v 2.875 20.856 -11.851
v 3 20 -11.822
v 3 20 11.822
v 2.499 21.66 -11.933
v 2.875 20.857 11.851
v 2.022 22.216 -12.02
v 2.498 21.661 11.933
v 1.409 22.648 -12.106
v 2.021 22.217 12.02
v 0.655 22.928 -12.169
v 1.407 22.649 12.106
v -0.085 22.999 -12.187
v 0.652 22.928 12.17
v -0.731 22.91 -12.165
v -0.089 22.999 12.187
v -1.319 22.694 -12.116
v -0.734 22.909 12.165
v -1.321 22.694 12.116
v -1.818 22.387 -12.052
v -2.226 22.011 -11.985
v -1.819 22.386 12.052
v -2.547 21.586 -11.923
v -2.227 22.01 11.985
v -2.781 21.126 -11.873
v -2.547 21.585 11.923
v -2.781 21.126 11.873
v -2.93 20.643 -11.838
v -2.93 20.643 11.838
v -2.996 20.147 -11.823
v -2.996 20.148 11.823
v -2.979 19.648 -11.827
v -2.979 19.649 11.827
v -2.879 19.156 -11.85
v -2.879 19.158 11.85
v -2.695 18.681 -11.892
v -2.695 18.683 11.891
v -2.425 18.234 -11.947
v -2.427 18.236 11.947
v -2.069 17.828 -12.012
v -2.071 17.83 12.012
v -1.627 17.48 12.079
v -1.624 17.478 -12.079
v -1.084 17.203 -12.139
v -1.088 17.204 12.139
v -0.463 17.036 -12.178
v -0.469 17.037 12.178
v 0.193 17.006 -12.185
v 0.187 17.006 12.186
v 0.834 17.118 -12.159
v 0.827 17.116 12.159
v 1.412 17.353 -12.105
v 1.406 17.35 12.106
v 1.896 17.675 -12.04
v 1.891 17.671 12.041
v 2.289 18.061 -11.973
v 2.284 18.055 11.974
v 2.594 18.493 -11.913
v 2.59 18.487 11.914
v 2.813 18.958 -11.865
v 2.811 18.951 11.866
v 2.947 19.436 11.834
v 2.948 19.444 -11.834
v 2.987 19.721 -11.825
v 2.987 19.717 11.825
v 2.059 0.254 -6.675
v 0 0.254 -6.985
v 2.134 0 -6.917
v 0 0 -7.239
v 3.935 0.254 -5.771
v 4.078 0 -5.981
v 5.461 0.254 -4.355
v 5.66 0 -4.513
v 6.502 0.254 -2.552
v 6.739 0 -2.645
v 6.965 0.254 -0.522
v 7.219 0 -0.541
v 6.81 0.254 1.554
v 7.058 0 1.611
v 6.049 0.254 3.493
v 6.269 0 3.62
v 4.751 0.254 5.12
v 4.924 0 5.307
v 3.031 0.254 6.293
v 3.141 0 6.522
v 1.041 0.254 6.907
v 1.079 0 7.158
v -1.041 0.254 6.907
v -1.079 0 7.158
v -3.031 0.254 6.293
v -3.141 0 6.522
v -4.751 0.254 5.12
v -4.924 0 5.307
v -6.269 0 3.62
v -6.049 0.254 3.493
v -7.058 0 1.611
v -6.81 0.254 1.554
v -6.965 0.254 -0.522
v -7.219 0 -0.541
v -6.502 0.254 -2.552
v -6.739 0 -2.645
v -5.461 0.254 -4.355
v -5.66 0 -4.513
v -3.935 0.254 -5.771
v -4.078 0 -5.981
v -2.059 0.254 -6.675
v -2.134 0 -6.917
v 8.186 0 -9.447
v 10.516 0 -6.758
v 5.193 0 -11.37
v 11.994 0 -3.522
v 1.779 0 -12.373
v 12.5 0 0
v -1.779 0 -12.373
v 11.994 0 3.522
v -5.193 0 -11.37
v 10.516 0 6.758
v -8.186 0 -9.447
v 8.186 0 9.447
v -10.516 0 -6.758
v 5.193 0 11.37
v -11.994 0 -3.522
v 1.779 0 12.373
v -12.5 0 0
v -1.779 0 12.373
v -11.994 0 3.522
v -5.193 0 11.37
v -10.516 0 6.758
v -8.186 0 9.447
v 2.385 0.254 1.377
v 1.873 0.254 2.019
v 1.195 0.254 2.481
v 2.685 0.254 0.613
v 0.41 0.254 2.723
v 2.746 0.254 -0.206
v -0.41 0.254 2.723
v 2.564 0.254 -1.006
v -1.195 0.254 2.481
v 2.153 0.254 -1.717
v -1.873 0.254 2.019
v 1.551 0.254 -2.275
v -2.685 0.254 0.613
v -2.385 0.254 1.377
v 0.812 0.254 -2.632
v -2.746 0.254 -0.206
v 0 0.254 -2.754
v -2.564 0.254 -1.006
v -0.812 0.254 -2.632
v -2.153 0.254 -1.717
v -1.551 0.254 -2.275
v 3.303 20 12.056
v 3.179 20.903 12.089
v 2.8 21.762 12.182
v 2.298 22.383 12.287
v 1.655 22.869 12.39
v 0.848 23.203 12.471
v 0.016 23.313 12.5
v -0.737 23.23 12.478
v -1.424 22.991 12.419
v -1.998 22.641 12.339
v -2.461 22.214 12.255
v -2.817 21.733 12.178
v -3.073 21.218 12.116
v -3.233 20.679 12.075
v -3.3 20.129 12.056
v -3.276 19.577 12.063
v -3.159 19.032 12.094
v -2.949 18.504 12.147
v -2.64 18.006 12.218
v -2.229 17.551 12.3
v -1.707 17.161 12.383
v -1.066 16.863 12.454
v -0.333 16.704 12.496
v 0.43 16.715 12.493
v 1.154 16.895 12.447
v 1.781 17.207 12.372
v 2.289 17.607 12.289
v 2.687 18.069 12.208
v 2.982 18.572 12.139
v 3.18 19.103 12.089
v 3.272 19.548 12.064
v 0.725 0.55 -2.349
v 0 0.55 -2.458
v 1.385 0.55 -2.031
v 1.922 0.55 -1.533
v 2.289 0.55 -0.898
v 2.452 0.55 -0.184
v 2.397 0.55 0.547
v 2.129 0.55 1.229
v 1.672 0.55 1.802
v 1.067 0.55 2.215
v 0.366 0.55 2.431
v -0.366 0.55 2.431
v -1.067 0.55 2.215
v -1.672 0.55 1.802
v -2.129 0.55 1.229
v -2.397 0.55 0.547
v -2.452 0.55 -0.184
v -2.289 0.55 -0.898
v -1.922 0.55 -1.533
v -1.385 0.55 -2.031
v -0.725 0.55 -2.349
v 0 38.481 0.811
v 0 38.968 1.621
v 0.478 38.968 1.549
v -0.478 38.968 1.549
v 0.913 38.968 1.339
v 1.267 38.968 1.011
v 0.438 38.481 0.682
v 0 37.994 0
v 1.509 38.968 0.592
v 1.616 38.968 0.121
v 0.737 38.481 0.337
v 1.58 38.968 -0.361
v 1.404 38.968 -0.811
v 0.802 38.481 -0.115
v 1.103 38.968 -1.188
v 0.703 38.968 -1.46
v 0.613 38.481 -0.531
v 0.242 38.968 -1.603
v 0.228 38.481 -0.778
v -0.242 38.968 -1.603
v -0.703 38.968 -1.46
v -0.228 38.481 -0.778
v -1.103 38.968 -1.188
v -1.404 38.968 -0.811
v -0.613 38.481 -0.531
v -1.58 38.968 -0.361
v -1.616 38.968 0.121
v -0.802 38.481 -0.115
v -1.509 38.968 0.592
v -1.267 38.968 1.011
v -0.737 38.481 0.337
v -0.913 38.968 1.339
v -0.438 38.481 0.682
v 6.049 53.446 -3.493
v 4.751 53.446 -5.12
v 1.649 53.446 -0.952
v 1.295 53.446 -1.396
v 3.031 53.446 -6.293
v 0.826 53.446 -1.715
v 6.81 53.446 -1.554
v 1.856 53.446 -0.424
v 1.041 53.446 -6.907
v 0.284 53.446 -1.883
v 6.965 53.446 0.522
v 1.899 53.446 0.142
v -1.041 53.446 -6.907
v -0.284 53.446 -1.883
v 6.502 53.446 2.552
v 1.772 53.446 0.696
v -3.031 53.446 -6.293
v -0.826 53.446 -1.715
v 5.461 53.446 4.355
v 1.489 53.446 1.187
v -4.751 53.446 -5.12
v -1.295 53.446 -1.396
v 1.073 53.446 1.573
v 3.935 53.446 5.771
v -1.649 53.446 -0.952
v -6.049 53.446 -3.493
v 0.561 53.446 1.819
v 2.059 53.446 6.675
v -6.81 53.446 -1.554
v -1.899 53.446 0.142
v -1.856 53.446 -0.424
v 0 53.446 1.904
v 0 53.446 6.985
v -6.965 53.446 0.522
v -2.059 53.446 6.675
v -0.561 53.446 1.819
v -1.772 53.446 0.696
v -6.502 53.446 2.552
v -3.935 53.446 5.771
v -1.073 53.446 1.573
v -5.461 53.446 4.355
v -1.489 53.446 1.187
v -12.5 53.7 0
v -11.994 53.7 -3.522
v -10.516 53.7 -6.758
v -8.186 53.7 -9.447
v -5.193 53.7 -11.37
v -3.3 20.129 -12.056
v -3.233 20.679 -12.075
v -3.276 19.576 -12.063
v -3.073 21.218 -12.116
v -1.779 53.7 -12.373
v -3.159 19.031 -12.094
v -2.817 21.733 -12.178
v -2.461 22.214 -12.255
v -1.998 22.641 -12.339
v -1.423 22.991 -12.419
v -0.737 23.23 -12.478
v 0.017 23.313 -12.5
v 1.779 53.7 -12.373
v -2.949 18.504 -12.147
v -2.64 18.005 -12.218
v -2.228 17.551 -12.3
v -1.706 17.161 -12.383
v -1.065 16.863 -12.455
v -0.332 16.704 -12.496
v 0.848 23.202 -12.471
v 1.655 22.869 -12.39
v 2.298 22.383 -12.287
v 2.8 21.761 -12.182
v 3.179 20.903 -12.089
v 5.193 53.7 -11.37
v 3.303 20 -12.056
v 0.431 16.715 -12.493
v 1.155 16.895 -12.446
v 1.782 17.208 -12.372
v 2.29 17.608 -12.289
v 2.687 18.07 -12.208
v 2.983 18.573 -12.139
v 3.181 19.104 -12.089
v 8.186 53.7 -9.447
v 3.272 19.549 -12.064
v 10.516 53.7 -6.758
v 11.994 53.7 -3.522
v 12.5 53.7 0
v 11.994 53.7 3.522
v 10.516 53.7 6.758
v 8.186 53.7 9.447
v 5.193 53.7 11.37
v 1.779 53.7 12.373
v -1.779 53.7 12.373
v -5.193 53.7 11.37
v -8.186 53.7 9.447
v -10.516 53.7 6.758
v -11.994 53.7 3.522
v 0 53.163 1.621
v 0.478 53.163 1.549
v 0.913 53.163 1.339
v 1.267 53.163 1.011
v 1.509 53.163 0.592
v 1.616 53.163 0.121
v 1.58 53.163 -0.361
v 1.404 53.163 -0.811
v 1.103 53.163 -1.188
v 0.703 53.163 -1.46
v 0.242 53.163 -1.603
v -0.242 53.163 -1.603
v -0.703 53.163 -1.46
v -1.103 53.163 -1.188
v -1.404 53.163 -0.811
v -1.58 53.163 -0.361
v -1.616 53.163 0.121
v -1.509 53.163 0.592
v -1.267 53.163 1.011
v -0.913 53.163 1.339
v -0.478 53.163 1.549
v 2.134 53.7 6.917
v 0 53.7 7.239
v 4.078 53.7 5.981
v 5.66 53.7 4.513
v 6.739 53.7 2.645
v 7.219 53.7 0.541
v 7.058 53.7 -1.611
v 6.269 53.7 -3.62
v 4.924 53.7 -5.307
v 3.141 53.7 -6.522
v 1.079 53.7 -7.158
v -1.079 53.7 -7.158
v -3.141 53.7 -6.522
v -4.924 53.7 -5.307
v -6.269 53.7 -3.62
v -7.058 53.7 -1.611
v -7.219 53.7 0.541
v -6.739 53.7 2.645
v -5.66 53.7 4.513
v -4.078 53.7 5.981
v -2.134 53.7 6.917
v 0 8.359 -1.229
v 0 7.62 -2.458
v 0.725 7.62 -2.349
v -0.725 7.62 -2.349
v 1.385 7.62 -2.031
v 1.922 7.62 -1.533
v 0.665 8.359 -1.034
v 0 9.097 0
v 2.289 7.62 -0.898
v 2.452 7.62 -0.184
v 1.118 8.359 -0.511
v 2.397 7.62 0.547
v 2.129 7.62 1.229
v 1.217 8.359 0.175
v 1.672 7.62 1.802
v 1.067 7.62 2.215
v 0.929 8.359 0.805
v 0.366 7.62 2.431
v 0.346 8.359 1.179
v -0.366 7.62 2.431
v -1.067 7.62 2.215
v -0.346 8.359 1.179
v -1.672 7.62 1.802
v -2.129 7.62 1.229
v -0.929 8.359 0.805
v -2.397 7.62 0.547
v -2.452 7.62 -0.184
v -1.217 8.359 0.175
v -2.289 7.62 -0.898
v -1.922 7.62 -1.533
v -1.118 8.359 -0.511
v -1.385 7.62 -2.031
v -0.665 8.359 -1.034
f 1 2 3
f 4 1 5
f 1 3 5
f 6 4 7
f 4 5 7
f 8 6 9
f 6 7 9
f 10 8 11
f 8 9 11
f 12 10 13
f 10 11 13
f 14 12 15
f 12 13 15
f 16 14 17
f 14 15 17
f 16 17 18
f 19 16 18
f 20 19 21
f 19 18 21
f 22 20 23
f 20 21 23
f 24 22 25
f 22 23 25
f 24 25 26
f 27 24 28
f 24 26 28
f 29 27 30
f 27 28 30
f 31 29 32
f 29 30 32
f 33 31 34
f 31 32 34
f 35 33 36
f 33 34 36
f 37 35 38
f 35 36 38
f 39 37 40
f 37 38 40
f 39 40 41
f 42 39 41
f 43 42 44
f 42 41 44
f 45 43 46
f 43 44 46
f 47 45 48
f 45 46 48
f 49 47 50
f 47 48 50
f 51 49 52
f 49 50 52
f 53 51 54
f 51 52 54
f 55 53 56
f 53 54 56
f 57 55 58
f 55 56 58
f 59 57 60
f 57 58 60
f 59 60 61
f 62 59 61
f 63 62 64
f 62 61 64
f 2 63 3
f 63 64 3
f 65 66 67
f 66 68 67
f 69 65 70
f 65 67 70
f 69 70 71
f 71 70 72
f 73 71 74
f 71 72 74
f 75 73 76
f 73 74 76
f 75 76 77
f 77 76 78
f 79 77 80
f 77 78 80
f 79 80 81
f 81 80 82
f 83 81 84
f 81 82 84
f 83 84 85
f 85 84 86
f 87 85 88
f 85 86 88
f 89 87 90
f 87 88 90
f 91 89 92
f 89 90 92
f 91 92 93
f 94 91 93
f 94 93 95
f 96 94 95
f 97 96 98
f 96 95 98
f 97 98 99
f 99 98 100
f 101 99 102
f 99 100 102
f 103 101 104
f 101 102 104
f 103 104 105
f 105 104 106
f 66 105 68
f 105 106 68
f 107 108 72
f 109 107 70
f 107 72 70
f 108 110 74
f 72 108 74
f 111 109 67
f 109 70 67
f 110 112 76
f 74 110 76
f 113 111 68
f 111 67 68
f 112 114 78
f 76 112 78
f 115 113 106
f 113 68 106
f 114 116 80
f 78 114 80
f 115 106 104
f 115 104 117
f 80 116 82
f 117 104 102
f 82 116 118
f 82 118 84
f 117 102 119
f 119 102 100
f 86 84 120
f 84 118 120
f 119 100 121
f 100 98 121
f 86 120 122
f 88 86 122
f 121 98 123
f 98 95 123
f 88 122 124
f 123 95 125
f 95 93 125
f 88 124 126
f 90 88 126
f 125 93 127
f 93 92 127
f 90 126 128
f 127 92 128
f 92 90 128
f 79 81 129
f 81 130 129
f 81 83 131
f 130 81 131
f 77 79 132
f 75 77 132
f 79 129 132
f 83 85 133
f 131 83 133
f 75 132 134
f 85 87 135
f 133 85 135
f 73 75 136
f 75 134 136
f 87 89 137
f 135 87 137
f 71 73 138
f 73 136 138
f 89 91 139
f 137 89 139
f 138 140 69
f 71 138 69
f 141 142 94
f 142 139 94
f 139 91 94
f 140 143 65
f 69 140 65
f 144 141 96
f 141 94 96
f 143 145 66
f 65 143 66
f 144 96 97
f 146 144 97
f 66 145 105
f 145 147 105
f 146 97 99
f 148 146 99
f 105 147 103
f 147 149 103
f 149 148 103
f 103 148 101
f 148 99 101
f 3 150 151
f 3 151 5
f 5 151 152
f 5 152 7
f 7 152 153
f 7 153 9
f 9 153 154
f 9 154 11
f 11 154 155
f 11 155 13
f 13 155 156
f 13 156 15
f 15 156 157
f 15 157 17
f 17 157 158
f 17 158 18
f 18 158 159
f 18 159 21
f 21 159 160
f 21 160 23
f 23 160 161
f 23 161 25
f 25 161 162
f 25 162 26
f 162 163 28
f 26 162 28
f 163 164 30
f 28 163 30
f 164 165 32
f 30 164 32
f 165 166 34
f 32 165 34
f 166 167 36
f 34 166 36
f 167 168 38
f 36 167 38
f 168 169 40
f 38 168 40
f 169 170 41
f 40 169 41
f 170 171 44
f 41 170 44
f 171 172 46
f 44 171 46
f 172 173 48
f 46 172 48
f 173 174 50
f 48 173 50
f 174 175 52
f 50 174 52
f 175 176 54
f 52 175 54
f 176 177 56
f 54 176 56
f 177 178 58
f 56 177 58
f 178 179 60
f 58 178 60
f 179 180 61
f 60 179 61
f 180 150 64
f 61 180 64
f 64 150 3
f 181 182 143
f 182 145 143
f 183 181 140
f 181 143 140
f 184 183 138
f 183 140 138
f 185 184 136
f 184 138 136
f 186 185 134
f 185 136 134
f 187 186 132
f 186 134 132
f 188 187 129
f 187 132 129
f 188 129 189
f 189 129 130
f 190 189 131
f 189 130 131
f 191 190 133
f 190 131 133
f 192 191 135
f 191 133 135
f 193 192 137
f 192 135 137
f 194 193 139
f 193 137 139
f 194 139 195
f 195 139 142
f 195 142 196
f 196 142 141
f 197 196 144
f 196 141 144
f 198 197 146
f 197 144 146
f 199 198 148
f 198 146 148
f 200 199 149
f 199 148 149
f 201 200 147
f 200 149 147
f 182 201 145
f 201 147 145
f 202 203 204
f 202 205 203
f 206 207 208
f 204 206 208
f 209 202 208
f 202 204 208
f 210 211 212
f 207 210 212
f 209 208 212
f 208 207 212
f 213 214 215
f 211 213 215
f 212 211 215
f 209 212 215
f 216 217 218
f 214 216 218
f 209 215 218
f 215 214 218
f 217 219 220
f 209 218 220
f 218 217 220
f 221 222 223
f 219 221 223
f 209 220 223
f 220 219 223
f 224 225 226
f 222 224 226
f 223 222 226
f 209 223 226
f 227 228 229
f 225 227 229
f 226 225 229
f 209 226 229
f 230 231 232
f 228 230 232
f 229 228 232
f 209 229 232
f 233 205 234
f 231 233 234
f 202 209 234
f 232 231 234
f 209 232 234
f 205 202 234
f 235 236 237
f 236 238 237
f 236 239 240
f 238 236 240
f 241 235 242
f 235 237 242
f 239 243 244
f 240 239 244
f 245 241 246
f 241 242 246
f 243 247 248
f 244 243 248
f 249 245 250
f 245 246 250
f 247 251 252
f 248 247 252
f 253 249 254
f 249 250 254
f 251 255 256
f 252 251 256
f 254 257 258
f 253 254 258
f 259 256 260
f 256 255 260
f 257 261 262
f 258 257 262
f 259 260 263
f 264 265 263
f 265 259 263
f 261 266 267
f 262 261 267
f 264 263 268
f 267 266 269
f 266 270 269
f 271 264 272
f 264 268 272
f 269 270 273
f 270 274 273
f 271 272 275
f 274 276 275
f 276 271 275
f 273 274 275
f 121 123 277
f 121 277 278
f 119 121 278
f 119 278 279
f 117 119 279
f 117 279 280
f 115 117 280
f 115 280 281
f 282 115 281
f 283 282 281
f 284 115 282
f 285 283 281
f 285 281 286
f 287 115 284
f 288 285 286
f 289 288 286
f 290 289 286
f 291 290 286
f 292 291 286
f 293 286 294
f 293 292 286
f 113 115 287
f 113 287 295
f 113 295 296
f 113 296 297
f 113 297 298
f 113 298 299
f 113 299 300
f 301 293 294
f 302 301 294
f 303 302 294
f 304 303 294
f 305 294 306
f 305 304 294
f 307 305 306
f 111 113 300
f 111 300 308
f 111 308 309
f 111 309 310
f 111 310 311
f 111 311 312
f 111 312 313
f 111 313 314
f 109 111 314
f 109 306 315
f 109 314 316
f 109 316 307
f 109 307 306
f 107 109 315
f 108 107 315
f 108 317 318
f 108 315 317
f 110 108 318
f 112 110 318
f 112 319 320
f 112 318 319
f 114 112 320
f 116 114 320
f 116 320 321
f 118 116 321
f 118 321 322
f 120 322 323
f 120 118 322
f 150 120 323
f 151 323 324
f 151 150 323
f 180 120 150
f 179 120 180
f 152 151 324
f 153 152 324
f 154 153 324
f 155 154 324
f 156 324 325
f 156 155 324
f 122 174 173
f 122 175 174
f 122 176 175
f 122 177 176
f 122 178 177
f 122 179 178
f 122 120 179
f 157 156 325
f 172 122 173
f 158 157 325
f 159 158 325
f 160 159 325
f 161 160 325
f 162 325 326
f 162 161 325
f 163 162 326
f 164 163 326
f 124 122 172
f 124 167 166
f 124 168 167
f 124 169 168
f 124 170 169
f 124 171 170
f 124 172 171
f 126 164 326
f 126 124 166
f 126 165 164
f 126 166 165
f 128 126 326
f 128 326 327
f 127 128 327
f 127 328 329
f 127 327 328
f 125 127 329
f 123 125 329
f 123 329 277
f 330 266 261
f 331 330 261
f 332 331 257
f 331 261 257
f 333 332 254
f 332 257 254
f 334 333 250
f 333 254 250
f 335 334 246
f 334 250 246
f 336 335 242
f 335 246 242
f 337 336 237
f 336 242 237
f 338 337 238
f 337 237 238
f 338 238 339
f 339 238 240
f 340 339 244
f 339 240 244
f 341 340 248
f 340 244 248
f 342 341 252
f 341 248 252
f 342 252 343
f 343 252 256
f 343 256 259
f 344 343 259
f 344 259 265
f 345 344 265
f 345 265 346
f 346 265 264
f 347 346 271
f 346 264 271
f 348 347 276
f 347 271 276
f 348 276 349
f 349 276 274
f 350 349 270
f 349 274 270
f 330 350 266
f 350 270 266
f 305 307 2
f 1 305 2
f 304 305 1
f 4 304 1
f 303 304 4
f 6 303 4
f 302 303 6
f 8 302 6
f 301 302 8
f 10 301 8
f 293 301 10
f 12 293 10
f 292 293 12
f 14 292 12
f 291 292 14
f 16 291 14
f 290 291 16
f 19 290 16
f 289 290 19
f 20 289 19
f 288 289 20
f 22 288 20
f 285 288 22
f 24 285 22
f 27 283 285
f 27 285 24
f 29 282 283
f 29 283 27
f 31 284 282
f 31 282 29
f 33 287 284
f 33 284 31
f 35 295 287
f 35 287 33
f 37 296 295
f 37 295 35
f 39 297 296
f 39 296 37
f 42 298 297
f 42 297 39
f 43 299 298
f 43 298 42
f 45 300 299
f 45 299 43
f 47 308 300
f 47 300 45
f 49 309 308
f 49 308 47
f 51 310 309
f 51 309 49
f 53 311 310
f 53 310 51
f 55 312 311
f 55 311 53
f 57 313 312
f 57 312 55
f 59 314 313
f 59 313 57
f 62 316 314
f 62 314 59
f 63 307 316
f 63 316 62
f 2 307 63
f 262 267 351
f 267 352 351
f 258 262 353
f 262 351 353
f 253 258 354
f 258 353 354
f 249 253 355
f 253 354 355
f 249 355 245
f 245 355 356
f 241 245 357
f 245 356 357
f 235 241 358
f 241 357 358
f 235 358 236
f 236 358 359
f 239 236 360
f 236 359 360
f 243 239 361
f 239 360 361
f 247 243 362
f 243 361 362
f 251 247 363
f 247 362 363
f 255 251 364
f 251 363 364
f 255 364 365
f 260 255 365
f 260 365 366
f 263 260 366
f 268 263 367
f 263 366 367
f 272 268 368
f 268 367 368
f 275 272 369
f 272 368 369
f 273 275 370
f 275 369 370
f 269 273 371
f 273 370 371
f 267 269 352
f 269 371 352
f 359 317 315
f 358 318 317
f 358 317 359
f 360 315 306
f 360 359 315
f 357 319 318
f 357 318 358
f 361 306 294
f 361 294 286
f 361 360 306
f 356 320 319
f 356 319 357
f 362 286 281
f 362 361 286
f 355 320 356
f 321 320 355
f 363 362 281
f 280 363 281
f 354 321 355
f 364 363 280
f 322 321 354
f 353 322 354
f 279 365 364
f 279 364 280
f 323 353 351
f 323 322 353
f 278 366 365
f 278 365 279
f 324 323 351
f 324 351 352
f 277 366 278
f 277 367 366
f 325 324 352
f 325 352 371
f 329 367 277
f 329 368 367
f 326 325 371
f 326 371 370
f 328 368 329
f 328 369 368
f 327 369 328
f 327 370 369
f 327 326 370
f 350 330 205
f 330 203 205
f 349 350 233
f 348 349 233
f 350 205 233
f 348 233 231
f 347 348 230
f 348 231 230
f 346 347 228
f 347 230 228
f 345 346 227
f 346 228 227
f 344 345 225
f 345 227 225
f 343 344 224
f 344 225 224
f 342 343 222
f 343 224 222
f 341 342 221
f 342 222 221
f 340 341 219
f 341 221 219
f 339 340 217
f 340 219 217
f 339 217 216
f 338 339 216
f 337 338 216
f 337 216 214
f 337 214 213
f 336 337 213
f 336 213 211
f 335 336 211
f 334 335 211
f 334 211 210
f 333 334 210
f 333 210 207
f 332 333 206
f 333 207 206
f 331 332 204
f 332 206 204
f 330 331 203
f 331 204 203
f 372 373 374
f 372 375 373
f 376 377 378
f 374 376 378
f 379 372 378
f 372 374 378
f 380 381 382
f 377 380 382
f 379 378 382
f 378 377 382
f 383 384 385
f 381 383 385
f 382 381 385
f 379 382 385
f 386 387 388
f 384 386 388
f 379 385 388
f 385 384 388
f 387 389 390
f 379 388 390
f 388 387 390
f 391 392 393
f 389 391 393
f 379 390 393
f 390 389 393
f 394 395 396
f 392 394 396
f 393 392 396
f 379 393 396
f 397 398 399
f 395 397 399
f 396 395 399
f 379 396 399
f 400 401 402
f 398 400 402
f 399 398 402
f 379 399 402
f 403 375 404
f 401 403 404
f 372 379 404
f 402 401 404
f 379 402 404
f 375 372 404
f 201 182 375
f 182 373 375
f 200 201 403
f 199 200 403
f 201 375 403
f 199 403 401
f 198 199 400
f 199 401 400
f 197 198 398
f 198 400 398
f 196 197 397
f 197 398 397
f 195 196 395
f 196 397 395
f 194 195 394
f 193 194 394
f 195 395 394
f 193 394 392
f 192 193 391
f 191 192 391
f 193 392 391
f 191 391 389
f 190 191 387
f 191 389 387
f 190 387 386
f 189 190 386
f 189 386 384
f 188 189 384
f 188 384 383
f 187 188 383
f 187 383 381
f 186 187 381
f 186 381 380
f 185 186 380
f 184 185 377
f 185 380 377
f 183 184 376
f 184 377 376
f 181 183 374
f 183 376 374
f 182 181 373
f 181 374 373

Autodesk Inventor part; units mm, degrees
ref_plane "YZ Plane" through (0, 0, 0) normal (1, 0, 0) x (0, 1, 0)
ref_plane "XZ Plane" through (0, 0, 0) normal (0, 1, 0) x (-1, 0, 0)
ref_plane "XY Plane" through (0, 0, 0) normal (0, 0, 1) x (1, 0, 0)
sketch "Sketch1" plane through (0, 0, 0) normal (0, 1, 0) x (-1, 0, 0)
  circle A0 centre (0, 0) radius 12.5
  dimension "d0" = 25
extrude "Extrusion1" add sketch "Sketch1" along normal blind 53.7
hole "ReliefTop" at (0, 53.7, 0) direction (0, -1, 0) diameter 13.97 depth 0.254 countersink diameter 14.478 countersink angle 90
hole "ReliefBottom" at (0, 0, 0) direction (0, 1, 0) diameter 13.97 depth 0.254 countersink diameter 14.478 countersink angle 90
hole "MountBottomM6" at (0, 0.254, 0) direction (0, 1, 0) diameter 4.917 depth 7.366 tip angle 118 countersink diameter 5.508 countersink angle 90 thread size "M6x1" class "6H" standard "ISO Metric profile"
hole "MountTopM4" at (0, 53.446, 0) direction (0, -1, 0) diameter 3.242 depth 14.478 tip angle 118 countersink diameter 3.808 countersink angle 90 thread size "M4x0.7" class "6H" standard "ISO Metric profile"
sketch "Sketch2" plane through (0, 0, 0) normal (0, 0, 1) x (1, 0, 0)
  circle A0 centre (0, 20) radius 3
  line L0 (-12.5, 0) -> (12.5, 0) projected
  line L1 (0, -4.6) -> (0, 27.6) projected
  point P0 (0, 0)
  dimension "d49" = 6
  dimension "d50" = 20
extrude "Extrusion2" cut sketch "Sketch2" along normal through all both and the other way through all
chamfer "Chamfer1" distance 0.313 angle 45 2 edges at (-3, 19.9998, 12.1347) (-3, 19.9998, -12.1347)
equation "\"d1\" = height"
equation "\"d5\" = reliefMinor"
equation "\"d7\" = reliefMajor"
equation "\"d10\" = reliefDepth"
equation "\"d14\" = reliefMinor"
equation "\"d16\" = reliefMajor"
equation "\"d19\" = reliefDepth"
equation "\"d25\" = chamferM6"
equation "\"d28\" = depthM6"
equation "\"d40\" = chamferM4"
equation "\"d43\" = depthM4"
equation "\"reliefDepth\" = 0.254"
equation "\"reliefMinor\" = 13.97"
equation "\"reliefMajor\" = 14.478"
equation "\"chamferM6\" = 5.508"
equation "\"chamferM4\" = 3.808"
equation "\"depthM6\" = 7.366"
equation "\"depthM4\" = 14.478"
equation "\"height\" = 53.7"
properties part number "PLS-P642H0537A00_M" material "Stainless Steel"
